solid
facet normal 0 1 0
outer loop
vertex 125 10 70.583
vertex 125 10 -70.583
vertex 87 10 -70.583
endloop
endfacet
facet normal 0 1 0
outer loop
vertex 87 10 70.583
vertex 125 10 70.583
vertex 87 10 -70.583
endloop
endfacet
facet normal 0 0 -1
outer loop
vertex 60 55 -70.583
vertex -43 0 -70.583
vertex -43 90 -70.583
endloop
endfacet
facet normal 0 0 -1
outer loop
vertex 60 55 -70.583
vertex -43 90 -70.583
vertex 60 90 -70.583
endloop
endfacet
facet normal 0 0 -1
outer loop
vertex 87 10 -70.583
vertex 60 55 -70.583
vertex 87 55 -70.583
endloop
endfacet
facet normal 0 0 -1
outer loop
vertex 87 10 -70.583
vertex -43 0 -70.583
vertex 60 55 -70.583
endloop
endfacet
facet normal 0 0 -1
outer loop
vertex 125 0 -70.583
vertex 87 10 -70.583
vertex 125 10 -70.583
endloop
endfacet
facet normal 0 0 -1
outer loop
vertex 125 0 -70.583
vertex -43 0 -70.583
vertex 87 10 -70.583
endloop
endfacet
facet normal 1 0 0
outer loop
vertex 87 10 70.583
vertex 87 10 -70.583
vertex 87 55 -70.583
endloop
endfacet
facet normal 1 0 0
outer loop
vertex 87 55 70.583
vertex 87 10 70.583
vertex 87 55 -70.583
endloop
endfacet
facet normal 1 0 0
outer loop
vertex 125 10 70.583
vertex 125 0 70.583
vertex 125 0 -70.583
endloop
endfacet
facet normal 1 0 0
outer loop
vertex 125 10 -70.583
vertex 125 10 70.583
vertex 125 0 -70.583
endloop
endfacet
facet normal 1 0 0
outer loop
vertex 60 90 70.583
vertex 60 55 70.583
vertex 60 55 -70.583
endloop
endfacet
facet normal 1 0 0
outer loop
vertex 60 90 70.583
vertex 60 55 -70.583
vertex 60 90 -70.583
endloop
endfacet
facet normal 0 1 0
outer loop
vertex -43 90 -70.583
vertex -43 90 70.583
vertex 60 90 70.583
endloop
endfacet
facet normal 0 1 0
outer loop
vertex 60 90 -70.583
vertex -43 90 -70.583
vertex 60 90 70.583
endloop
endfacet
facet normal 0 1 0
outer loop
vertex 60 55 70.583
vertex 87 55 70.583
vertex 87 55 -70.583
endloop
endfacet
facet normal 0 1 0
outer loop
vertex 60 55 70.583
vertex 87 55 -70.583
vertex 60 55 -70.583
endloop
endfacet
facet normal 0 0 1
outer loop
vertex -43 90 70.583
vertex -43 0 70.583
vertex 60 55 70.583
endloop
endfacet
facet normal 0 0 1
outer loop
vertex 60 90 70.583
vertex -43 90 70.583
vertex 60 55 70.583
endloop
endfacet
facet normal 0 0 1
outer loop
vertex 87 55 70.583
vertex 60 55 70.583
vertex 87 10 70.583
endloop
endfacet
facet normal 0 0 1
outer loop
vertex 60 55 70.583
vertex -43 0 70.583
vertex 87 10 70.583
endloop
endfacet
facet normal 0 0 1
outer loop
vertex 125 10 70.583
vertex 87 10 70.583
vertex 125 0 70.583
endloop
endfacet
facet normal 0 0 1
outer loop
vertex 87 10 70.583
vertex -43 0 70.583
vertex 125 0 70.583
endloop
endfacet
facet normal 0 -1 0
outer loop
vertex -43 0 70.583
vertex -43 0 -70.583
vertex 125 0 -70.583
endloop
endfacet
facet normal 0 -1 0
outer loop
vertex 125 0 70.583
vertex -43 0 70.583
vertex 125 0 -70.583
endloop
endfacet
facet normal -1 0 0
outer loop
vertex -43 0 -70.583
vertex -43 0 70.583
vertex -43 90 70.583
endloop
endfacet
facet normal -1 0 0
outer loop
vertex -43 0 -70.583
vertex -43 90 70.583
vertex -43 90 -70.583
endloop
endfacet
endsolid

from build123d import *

# Parameters (mm, degrees)
SKETCH1_W               = 168
SKETCH1_H               = 141.165136176
BOSS_EXTRUDE1_DEPTH     = 90
CUT_EXTRUDE1_DEPTH      = 170.43110375
CUT_EXTRUDE1_DEPTH_BACK = 170.43110375


with BuildPart() as part:
    # Sketch1 → Boss-Extrude1 (new body)
    with BuildSketch(Plane(origin=(0, 0, 0), x_dir=(1, 0, 0), z_dir=(0, 1, 0))):
        with Locations((41, 0)):
            Rectangle(SKETCH1_W, SKETCH1_H)
    extrude(amount=BOSS_EXTRUDE1_DEPTH)

    # Sketch2 → Cut-Extrude1 (cut, two sides: drawn at the far end of the back side and taken through both)
    with BuildSketch(Plane.XY.offset(-CUT_EXTRUDE1_DEPTH_BACK)):
        Polygon((125, 90), (125, 10), (87, 10), (87, 55), (60, 55), (60, 90), align=None)
    extrude(amount=CUT_EXTRUDE1_DEPTH + CUT_EXTRUDE1_DEPTH_BACK, mode=Mode.SUBTRACT)


solid = part.part
